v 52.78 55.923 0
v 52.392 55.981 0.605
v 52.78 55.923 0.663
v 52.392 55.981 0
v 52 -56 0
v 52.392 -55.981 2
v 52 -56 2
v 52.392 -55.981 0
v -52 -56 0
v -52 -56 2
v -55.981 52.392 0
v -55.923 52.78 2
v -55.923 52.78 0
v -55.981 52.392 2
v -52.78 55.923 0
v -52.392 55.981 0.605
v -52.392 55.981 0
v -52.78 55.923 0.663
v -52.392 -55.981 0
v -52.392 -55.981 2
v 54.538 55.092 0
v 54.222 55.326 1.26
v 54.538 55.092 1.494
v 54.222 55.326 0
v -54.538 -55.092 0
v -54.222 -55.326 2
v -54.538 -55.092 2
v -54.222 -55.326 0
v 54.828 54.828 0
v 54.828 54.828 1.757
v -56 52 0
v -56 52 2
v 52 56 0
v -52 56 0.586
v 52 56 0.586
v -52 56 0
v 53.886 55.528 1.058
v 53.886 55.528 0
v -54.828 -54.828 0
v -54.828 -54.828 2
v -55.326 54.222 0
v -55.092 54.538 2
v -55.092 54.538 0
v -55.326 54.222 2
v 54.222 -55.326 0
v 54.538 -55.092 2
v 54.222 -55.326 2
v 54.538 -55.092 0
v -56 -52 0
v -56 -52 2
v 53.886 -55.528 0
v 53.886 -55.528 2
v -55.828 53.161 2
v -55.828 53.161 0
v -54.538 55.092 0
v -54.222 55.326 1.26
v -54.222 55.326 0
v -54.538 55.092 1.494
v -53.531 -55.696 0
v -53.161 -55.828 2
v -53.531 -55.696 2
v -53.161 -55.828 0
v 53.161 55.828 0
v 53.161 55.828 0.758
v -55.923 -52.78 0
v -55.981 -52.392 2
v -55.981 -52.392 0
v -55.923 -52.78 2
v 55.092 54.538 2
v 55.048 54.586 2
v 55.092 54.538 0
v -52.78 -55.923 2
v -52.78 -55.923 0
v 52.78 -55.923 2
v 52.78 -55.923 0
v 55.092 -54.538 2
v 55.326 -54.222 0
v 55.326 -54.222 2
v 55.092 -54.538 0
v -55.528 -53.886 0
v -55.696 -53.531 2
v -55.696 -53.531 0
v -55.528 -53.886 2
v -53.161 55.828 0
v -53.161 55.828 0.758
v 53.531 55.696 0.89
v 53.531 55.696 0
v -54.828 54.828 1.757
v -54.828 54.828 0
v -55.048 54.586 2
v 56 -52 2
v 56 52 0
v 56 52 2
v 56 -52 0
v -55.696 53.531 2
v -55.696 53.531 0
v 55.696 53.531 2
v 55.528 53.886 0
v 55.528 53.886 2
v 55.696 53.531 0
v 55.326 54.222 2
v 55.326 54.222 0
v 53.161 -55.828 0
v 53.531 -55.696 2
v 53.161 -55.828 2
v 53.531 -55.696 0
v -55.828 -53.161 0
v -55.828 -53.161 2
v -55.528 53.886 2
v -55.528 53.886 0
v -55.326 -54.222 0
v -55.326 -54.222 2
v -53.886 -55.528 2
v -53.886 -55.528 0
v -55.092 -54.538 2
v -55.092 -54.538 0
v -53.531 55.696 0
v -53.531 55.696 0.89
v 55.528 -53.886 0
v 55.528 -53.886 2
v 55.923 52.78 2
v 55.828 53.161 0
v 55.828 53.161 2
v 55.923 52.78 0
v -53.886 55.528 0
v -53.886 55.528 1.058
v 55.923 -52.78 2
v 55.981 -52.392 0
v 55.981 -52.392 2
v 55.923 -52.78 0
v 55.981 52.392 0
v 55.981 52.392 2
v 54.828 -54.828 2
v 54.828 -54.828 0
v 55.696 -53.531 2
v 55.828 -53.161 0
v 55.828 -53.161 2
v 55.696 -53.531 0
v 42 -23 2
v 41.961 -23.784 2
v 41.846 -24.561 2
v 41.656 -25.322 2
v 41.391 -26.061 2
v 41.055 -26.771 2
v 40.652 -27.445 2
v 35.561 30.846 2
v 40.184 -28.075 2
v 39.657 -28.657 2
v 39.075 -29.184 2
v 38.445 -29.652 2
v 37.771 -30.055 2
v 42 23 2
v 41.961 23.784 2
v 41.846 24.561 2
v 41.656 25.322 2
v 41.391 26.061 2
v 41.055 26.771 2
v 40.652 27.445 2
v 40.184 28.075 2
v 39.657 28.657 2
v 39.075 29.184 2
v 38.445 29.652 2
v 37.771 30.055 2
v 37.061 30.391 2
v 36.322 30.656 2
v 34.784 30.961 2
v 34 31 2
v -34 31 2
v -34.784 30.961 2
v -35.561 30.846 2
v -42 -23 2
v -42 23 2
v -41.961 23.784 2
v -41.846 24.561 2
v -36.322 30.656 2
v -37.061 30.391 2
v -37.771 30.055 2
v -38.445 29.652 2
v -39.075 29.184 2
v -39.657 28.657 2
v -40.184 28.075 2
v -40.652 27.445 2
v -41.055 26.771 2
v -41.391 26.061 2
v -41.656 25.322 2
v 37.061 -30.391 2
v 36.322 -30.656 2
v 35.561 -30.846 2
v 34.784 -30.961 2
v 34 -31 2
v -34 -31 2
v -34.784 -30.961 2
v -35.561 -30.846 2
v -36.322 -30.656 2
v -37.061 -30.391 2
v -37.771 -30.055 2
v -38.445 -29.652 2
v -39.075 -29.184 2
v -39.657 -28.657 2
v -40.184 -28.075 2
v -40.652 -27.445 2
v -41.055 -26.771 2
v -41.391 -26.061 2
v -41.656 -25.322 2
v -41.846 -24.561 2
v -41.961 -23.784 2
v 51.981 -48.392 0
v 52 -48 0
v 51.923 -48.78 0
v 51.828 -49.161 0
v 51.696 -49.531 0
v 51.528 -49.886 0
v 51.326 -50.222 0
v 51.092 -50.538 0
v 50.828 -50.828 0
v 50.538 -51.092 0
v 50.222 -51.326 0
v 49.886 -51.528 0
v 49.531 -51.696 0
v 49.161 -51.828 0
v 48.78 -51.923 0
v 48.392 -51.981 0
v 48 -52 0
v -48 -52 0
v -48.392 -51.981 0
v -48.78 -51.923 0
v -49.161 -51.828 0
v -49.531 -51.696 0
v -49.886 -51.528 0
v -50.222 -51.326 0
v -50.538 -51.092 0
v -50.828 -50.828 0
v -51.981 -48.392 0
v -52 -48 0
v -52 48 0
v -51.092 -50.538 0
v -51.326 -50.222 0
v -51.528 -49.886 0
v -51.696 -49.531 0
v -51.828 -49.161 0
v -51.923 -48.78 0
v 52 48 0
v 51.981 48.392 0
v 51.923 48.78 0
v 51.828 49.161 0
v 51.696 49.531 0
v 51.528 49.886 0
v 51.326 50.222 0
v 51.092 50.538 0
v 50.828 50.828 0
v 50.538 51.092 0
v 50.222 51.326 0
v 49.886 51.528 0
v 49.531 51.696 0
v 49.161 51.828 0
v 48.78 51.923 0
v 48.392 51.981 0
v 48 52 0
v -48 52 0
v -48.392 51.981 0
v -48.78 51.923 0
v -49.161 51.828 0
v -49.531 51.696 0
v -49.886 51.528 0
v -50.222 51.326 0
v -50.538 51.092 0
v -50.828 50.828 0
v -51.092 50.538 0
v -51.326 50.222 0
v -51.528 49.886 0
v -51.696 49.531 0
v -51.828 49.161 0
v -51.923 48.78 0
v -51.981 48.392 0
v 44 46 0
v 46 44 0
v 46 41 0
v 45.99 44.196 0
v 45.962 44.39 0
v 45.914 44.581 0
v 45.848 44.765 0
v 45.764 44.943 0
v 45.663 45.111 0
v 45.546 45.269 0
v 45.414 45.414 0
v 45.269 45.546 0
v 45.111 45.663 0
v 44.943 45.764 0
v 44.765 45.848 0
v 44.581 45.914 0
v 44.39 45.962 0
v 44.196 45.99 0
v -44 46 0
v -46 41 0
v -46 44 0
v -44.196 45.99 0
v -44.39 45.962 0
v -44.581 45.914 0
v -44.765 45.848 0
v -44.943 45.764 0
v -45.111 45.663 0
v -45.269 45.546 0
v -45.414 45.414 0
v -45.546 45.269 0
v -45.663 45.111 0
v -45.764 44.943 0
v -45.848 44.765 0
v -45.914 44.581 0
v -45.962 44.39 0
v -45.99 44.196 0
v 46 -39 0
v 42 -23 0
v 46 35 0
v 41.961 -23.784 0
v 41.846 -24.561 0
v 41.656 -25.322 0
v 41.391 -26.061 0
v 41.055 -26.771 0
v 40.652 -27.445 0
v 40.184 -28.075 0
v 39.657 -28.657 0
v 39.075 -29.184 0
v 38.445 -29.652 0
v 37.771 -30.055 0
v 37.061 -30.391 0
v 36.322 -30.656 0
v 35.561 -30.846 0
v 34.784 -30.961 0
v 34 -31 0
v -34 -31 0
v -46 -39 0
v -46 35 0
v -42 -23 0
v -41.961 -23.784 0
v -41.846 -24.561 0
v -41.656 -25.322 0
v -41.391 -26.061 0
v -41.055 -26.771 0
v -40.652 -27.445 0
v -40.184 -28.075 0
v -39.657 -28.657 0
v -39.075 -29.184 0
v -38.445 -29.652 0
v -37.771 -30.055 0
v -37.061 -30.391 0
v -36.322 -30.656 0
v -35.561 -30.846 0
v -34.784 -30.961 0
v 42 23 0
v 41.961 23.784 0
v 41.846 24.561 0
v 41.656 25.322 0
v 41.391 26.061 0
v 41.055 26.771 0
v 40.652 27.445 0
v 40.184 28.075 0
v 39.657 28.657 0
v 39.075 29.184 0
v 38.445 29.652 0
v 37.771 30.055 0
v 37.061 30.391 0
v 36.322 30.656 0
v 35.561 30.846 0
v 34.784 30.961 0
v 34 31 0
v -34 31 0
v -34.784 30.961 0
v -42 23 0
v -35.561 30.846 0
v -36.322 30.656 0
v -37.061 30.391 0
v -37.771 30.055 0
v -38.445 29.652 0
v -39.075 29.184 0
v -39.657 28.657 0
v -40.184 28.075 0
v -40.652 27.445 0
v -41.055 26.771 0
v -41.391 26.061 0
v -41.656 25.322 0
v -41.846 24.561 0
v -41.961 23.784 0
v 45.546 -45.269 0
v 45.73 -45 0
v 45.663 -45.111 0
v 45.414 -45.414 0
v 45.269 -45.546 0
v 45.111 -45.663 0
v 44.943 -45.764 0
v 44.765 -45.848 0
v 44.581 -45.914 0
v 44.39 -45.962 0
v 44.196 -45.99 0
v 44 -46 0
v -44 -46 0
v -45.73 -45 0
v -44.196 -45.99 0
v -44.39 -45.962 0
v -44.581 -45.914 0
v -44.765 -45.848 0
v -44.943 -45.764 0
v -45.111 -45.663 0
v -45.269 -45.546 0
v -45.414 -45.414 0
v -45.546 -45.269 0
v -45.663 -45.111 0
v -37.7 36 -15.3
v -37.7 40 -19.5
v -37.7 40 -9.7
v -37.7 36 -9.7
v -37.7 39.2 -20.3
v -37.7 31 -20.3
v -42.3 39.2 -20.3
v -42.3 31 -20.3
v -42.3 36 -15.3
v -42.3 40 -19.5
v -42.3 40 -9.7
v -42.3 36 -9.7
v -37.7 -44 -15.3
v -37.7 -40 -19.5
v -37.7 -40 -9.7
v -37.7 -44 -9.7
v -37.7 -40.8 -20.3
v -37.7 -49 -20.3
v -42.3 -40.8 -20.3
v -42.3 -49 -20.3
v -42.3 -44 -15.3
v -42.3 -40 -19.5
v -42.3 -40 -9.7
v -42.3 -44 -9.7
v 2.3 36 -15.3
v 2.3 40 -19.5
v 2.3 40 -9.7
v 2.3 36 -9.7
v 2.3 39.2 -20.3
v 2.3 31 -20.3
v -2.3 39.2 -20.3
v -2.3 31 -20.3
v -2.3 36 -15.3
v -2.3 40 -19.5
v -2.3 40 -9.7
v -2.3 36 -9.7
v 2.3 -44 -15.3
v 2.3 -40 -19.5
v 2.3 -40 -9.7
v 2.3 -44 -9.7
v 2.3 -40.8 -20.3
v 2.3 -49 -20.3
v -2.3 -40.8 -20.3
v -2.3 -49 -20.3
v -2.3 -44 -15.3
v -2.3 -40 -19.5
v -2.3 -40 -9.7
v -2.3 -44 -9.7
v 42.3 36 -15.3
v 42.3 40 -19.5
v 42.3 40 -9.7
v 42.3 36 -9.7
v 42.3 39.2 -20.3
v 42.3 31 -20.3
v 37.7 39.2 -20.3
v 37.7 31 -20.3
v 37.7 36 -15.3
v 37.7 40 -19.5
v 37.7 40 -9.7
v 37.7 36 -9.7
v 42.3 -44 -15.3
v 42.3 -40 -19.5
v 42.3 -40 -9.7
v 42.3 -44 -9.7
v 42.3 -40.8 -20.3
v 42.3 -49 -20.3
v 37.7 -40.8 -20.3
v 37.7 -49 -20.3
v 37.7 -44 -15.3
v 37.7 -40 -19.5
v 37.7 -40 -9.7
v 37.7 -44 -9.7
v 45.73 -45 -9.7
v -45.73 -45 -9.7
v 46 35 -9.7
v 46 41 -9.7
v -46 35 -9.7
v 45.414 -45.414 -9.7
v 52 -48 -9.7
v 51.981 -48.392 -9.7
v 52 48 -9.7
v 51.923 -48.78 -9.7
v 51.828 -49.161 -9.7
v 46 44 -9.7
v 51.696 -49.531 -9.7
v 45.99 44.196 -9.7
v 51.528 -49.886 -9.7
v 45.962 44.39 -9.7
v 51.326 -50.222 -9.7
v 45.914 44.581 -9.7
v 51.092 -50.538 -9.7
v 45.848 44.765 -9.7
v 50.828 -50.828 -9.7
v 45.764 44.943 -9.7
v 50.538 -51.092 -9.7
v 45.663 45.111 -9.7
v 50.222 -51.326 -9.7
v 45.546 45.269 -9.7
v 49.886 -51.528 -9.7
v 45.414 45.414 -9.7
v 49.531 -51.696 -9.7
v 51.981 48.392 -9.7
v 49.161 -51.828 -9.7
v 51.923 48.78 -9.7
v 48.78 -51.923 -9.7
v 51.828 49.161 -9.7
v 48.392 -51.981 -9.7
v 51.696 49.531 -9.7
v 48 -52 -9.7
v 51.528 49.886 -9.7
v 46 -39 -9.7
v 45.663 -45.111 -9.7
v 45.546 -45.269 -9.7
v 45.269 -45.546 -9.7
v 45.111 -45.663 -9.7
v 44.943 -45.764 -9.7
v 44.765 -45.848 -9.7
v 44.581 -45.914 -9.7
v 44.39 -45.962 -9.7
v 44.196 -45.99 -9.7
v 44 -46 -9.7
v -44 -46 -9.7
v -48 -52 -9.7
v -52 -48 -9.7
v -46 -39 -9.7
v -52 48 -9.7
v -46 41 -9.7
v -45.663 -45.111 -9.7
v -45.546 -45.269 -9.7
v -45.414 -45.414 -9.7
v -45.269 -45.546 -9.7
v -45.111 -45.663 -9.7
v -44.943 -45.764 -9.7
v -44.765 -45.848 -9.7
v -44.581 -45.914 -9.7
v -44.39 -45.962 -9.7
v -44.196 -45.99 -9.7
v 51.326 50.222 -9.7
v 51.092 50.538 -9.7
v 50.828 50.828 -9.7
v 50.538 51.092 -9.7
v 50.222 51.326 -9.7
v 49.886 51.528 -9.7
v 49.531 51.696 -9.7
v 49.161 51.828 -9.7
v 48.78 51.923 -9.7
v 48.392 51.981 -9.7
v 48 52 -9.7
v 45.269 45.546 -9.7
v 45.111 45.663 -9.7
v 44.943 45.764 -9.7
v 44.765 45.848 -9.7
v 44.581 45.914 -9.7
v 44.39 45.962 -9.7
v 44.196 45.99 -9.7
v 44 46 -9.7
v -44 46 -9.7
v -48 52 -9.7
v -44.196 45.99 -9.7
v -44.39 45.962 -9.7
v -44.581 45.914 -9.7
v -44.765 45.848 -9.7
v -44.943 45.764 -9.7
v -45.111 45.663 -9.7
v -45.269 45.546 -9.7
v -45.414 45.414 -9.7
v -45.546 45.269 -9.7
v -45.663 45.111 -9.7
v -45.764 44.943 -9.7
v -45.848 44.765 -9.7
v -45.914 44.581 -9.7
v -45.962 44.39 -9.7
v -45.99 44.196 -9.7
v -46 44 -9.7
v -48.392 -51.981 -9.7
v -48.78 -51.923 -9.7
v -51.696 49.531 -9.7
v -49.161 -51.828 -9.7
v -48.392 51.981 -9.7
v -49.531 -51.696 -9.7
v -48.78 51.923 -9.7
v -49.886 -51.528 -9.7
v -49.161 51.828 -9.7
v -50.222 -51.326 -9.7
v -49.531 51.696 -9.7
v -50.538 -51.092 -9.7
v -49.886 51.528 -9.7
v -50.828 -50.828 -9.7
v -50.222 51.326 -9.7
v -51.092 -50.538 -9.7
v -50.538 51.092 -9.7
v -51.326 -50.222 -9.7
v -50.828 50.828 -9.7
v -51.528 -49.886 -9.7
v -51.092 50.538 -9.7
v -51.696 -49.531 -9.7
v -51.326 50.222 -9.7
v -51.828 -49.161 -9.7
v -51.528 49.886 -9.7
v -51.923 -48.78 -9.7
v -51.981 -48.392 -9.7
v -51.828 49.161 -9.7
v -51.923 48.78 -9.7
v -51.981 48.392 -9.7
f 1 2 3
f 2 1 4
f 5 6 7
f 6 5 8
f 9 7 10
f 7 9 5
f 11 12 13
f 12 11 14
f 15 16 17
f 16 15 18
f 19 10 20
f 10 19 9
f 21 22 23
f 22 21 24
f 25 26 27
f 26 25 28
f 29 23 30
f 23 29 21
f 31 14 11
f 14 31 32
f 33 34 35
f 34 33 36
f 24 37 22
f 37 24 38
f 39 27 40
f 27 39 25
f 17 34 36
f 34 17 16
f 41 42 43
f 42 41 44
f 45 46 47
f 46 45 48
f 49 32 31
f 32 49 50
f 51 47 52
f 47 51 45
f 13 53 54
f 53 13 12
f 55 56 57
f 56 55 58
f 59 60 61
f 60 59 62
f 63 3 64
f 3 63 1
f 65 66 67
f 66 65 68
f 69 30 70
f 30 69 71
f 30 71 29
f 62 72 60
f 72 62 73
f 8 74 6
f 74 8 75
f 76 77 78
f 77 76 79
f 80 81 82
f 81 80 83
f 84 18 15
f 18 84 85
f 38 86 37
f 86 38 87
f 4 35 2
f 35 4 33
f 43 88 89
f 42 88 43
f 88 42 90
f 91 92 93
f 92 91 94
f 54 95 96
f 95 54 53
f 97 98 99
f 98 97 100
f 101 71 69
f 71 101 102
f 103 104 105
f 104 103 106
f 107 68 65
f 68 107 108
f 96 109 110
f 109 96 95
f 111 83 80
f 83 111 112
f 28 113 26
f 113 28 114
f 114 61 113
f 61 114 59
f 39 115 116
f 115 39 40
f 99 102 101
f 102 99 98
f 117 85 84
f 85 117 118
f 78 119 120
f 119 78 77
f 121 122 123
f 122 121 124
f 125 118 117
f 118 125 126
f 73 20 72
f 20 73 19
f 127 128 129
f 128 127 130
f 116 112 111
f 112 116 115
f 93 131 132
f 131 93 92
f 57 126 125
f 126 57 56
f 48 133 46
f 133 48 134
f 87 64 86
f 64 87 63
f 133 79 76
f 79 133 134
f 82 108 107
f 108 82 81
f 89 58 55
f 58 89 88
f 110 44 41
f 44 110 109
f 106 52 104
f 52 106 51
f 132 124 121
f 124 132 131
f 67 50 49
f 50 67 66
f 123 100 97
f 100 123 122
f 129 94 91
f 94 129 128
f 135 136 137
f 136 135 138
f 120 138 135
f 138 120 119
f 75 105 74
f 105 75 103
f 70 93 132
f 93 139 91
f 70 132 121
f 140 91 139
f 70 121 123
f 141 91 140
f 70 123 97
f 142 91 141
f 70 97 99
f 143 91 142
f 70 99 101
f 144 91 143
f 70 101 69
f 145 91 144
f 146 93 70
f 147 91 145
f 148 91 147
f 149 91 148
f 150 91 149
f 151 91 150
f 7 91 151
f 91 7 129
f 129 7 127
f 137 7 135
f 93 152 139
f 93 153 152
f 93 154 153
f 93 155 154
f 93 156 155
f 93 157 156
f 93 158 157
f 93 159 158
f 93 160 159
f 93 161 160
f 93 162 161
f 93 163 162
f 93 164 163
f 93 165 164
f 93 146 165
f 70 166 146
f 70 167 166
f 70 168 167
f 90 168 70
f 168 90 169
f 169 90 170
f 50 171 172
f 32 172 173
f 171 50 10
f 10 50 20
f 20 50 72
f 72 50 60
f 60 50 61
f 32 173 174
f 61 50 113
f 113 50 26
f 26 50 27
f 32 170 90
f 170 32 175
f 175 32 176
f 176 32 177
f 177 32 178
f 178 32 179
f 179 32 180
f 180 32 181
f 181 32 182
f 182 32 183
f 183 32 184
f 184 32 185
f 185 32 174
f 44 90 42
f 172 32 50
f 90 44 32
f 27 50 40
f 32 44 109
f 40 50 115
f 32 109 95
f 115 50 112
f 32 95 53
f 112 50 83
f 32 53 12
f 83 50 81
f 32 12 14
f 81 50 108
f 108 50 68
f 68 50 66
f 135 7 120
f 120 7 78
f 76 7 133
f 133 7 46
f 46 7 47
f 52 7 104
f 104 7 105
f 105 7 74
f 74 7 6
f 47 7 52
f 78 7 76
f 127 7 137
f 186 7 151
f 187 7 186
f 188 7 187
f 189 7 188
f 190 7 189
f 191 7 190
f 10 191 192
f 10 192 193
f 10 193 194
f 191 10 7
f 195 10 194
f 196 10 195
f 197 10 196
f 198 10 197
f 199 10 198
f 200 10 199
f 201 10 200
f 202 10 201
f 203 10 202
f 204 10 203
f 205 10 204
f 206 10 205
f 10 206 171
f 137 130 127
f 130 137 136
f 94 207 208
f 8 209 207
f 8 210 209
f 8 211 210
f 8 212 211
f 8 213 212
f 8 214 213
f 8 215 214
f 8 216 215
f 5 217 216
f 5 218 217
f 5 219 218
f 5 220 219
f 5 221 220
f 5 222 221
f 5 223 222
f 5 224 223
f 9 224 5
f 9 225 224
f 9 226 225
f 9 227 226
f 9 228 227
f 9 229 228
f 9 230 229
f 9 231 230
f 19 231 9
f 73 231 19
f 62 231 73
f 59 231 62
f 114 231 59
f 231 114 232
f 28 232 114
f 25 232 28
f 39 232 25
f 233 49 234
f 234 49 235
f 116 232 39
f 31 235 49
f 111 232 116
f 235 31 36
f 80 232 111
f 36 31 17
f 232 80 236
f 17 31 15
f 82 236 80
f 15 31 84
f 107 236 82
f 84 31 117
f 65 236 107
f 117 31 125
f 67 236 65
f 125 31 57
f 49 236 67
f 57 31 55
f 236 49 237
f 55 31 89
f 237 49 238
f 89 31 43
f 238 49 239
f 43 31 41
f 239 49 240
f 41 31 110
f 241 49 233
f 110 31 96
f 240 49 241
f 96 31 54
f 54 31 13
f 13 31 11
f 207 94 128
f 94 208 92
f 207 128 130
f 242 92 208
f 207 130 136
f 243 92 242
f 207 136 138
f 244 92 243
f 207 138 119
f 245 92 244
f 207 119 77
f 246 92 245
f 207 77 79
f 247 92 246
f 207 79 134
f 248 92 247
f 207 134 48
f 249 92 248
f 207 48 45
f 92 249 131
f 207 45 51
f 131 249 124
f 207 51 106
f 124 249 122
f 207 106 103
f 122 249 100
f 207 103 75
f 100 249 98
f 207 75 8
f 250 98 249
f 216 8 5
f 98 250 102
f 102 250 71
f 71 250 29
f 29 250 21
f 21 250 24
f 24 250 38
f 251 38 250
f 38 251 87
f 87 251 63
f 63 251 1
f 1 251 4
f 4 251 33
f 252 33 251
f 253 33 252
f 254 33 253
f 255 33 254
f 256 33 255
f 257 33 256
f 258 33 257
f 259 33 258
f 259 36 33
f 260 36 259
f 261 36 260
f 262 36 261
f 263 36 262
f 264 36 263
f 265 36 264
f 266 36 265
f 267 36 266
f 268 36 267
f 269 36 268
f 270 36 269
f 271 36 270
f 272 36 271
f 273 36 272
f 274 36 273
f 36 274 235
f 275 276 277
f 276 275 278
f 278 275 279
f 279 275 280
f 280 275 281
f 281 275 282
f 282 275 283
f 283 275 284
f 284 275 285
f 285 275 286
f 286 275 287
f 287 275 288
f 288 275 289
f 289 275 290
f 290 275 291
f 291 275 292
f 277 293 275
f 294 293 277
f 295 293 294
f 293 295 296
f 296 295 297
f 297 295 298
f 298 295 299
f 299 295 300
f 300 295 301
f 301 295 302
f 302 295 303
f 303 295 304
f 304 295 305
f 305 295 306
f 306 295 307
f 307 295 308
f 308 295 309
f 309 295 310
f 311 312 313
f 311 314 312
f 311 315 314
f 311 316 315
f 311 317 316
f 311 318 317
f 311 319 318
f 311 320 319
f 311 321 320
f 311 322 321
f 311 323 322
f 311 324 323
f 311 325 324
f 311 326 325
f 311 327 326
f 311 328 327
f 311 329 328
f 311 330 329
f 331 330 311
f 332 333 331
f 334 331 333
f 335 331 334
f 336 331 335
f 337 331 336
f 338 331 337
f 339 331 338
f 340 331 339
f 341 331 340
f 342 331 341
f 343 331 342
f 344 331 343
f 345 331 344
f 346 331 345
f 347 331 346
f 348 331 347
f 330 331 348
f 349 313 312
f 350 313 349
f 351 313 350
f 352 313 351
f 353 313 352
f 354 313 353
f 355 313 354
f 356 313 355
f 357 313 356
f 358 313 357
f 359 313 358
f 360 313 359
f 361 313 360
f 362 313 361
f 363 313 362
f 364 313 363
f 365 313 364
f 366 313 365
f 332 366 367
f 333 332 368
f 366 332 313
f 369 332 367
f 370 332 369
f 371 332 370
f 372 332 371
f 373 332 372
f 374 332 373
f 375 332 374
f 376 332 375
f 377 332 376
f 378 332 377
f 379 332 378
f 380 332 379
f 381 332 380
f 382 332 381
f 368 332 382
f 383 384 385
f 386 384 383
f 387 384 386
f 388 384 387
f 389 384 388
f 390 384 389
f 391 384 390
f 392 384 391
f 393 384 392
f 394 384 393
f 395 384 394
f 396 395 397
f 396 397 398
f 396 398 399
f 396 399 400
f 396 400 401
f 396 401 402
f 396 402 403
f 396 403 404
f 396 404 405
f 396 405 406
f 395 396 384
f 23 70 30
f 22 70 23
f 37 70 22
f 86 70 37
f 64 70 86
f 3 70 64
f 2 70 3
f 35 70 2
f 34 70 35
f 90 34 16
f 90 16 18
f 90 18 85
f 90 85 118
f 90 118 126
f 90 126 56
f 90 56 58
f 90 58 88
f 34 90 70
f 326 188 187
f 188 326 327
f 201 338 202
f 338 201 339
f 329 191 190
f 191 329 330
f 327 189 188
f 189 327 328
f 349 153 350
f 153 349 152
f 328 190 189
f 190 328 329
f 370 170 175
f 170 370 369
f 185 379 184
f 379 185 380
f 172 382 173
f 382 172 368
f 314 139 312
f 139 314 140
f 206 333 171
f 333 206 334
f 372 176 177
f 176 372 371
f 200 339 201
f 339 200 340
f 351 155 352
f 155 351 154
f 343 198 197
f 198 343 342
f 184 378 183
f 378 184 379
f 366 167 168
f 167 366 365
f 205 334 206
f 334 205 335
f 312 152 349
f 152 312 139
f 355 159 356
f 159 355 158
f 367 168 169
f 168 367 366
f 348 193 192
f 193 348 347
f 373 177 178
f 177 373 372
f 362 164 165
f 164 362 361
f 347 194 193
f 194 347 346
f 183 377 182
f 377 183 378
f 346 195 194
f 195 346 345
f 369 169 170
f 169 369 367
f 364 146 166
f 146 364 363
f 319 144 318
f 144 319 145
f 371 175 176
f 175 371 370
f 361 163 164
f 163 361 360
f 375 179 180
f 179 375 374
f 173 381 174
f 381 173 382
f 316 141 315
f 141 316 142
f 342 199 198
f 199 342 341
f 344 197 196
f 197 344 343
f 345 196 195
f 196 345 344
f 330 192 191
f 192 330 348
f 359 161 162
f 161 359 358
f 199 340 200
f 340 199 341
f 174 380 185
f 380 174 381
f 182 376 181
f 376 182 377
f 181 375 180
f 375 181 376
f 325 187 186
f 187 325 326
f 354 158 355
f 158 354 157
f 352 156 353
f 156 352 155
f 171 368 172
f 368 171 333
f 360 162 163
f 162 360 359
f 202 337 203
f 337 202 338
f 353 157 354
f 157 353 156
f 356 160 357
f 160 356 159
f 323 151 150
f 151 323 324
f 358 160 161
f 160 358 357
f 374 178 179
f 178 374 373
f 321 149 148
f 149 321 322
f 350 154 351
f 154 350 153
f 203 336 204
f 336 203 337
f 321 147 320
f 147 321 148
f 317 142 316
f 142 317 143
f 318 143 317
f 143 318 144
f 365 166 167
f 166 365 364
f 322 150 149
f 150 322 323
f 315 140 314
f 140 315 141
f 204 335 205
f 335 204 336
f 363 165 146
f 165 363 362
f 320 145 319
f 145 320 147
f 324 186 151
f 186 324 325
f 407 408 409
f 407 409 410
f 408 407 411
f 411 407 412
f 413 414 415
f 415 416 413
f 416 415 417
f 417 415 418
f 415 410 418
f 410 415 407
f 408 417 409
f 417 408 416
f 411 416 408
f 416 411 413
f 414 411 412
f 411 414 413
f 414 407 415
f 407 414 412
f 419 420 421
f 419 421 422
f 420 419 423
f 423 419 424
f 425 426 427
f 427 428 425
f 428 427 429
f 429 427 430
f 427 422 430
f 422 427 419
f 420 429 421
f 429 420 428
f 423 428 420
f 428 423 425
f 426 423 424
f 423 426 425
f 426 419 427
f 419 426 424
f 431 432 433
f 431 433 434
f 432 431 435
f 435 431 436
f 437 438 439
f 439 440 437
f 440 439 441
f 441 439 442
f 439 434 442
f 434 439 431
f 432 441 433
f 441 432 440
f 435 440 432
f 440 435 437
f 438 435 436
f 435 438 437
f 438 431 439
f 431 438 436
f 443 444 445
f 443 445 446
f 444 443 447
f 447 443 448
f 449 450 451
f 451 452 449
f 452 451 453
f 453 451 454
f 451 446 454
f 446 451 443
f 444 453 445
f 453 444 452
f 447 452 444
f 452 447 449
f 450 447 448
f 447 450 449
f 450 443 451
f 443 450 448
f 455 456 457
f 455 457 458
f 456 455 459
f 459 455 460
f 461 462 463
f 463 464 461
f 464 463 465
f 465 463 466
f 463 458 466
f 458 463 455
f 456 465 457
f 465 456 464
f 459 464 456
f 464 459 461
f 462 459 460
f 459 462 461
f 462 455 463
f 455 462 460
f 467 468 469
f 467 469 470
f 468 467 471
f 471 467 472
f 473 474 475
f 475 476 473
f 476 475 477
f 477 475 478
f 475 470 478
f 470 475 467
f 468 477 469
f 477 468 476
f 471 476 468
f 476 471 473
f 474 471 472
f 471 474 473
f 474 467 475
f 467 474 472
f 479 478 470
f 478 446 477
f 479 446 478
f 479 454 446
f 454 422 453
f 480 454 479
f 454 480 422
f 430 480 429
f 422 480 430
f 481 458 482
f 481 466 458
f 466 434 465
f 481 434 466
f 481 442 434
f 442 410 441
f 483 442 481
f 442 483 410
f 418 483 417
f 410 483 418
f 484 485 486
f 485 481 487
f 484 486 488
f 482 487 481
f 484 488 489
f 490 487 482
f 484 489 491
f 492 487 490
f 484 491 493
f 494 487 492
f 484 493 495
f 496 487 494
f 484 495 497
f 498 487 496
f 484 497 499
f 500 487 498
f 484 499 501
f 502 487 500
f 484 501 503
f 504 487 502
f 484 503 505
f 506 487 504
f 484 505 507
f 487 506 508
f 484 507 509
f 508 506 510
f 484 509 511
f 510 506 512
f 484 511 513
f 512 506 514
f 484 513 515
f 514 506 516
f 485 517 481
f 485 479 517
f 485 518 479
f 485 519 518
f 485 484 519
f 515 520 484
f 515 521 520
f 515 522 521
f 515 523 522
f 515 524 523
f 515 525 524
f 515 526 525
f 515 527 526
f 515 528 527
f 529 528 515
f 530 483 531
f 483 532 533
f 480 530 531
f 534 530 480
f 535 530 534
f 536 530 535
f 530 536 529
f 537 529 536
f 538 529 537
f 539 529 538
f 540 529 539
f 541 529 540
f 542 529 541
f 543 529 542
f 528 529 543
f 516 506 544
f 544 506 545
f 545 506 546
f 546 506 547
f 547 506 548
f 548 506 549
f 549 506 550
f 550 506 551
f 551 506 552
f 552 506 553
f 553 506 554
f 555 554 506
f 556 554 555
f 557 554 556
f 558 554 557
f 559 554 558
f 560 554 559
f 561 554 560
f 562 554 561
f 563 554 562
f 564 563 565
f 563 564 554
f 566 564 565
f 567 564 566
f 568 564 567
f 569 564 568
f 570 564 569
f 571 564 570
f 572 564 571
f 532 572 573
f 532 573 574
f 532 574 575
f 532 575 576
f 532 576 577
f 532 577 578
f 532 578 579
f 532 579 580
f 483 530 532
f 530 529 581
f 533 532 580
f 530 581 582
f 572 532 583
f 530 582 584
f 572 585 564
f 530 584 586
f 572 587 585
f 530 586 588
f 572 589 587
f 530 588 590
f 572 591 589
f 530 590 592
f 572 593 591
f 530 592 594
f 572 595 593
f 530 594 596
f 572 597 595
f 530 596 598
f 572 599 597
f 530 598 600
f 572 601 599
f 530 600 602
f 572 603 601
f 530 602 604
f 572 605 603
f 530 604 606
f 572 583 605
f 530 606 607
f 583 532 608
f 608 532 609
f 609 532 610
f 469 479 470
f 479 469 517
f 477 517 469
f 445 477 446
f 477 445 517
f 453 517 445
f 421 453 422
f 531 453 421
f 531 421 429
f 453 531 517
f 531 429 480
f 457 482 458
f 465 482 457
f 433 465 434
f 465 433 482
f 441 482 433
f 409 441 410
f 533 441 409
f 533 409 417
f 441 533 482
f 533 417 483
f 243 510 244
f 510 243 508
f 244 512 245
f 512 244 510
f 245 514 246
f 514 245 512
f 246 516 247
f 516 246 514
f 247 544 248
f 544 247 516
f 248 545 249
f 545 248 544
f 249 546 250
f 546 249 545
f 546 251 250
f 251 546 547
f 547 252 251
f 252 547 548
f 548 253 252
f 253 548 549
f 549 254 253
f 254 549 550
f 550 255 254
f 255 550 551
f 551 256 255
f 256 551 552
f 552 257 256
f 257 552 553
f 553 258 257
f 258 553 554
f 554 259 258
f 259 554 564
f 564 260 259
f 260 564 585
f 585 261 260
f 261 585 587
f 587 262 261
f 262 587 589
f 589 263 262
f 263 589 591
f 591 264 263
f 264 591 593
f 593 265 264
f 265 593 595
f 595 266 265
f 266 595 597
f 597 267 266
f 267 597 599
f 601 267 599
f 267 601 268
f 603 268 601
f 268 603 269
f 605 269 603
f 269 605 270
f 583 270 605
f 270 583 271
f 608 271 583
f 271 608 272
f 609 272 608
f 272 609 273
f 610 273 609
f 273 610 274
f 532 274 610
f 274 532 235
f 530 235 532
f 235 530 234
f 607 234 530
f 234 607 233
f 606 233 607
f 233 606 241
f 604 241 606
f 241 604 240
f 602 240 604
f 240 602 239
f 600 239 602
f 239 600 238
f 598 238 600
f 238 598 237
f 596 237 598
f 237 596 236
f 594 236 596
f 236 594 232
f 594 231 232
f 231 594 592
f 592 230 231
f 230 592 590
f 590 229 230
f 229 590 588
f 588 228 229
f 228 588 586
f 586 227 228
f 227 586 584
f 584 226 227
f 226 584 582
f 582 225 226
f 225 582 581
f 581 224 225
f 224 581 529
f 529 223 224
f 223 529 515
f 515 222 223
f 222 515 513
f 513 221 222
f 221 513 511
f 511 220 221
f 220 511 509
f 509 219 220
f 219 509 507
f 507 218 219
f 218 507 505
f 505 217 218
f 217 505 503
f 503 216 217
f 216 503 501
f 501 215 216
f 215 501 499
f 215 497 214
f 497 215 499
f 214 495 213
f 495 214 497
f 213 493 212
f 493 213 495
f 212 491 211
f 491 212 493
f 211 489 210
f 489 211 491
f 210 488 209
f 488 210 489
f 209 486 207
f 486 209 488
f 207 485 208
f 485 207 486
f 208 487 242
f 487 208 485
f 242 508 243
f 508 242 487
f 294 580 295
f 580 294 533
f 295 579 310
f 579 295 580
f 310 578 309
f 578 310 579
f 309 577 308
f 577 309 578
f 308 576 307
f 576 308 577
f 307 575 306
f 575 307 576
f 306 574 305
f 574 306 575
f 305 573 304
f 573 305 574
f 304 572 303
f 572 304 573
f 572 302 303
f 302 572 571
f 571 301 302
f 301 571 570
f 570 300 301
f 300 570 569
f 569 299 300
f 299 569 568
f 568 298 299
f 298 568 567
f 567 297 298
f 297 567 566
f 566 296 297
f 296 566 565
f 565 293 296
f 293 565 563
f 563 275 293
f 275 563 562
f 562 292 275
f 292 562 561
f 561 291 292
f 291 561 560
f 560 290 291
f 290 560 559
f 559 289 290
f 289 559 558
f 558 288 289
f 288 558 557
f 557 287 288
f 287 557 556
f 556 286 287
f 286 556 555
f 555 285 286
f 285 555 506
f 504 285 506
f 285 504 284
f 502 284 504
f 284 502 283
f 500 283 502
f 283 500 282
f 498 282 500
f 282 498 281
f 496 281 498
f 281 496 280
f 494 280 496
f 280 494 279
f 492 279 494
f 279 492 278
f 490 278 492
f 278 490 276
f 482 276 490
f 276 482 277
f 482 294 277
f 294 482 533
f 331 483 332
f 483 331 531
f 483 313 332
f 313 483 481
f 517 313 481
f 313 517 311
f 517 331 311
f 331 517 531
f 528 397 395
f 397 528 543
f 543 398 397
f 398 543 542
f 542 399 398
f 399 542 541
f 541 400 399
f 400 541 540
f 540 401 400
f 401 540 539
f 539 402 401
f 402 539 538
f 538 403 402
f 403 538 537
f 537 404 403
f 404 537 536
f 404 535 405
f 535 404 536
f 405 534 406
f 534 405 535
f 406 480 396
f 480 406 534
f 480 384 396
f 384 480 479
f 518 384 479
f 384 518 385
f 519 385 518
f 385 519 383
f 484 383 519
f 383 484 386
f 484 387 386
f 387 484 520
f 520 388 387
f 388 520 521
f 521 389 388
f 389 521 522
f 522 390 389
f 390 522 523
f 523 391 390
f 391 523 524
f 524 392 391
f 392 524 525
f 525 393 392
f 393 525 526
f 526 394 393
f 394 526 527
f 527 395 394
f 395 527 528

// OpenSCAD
// =============================================================================
//  SKADIS mount kit for the rain "the101" 5G router
// =============================================================================
//
//  MOUNT TYPE (read off a photo of this unit's base, then measured directly):
//
//    the101 is a 230 x 230 x 56 mm rounded-square 5G CPE. Its underside has a
//    shallow square WELL ringed by moulded plastic retention TABS. A flat plate
//    slides in sideways and is captured under those tabs. There are no screw
//    bosses in the router.
//
//    Interface numbers, all measured off the router itself with calipers.
//    Commercially sold "the101 brackets" list dimensions that do not match this
//    unit, so nothing here is taken from them:
//      tab slot gap ......... 4.0 mm    (measured)
//      tab width ............ 12  mm    (measured)
//      well width ........... 112 mm    (measured)
//      well depth ........... NOT MEASURED - see well_depth below
//      BUILD TARGET ......... 112 x 112 x 2.0 mm, with a 104 mm standoff ring.
//                             2.0 mm in a 4.0 mm slot leaves ~2 mm of slop;
//                             see tongue_t.
//
//    So: a SLIDE-IN CAPTIVE PLATE. This file rebuilds that plate with SKADIS
//    pegs on the back instead of wall screws.
//
//  SKADIS interface (IKEA pegboard):
//    slots 5.0 x 15.0 mm on a plain 40 mm rectangular grid, board 5.2 mm thick.
//    Accessories hang off the BOTTOM edge of a slot.
//
//  ORIENTATION - this matters:
//    Hang the bracket so the router is lowered DOWN onto the tongue, i.e. the
//    well's open side faces down once the router is up. Gravity then holds the
//    plate seated, so no latch or detent is needed. To remove, lift.
//
//  PARTS - pick with `part` below:
//    "bracket" - the slide-in captive plate. The real answer. Prints flat with
//                no supports.
//    "hooks"   - a pair of cradle hooks. Needs nothing but the published body
//                size, so it works even if your unit's well differs at all.
// =============================================================================

/* [What to render] */
part = "bracket"; // [bracket:Slide-in plate, hooks:Cradle hooks, all:Both laid out]

/* [SKADIS board - leave alone for a genuine board] */
skadis_pitch = 40;    // slot grid pitch, both axes
slot_w       = 5.0;   // slot width
slot_h       = 15.0;  // slot height
board_t      = 5.2;   // pegboard thickness (use 3.0 for the thin variant)

/* [Printer fit tuning] */
peg_clear = 0.4;  // subtracted from slot_w to get peg width. Raise if pegs bind.
peg_gap   = 0.4;  // slop behind the board before the barb bites

/* [Peg shape] */
neck_h = 4.0;   // peg height sitting inside the slot
barb_h = 5.0;   // how far the barb drops behind the board
barb_d = 5.0;   // barb depth. Keep == barb_h: that is what makes the barb's
                // underside a 45 deg self-supporting face.

/* [Router interface - measured] */
tab_gap    = 4.0;    // the 4 mm slot under the retention tabs. Asserted against
                     // tongue_t below: a plate thicker than this will not enter.
plate_sq   = 112.0;  // what this unit's well takes
well_depth = 5.7;    // ASSUMED, not measured. Well floor down to the router's
                     // outer rim. Only feeds the standoff. Over-estimating is
                     // safe - it just widens the air gap. Under-estimating means
                     // the ribs foul the rim and the plate will not seat, so
                     // this deliberately errs high. Measure yours to tighten it.
tongue_fit = 0;      // extra clearance off plate_sq. Raise if it binds going in.

/* [Slide-in bracket] */
tongue_t = 2.0;   // plate thickness. NOTE this is still under the 4.0 mm tab
                  // slot, so the plate has ~2.0 mm of slop and the router can
                  // rock slightly. Raise toward 3.8 for a snug fit.
air_gap  = 6.0;   // clear air behind the router's vented underside. The whole
                  // point of the standoff ribs: mounted vertically, that face
                  // would otherwise sit flat on the fibreboard.
rib_w    = 6.0;   // standoff rib width. A rib's stiffness goes as its HEIGHT
                  // cubed and only linearly with width, so the 9.7 mm standoff
                  // is doing the work - 10 mm of width was just mass. 6 mm still
                  // leaves 1 mm either side of a peg neck.

rib_in   = 4.0;   // perimeter rib inset from the plate edge, i.e. the width of
                  // the bare lip around the outside of the plate. Also sets the
                  // ring's outer size: plate_sq - 2*rib_in = 104.
lead_in  = 1.0;   // 45 deg chamfer on the tongue's leading (top) edge
peg_cols = [-40, 0, 40];   // peg x positions. Spacings must be multiples of 40.
peg_rows = [40, -40];      // peg y positions. Spacings must be multiples of 40.

/* [Weight saving] */
lighten    = true;  // cut the dead centre out of the plate
light_edge = 4.0;   // plate left between that cutout and the ribs

/* [Cradle hooks] */
body_t       = 56;   // the101 body thickness, from rain's spec
hook_plate_w = 30;   // backplate width
hook_plate_h = 80;   // backplate height: 40 mm peg column + gusset tail below
hook_plate_t = 5;    // backplate thickness
hook_shelf_d = body_t + 6;   // shelf depth, the body plus a little
hook_shelf_t = 5;    // shelf thickness
hook_lip_h   = 22;   // front lip, stops the router tipping off
hook_lip_t   = 5;    // front lip thickness
hook_gusset  = 24;   // web height. The backplate runs on DOWN past the shelf by
                     // this much so the web has something to tie into - a web
                     // above the shelf would foul the router body.

$fn = 64;

assert(tongue_t <= tab_gap,
       "tongue_t exceeds tab_gap - the plate will not enter the tab slot");

// Standoff needed at the plate's back face. The plate sits tongue_t into the
// well, so the router's rim hangs (well_depth - tongue_t) proud of the plate's
// back and the ribs must clear that before the air gap even starts. With
// well_depth only assumed, this errs high on purpose.
standoff = air_gap + (well_depth - tongue_t);

// =============================================================================
//  SKADIS peg
// =============================================================================
//  Local origin sits on the plate's BACK face, neck top at y = 0. The peg grows
//  into -Z: first across the standoff gap, then through the board, then the barb.
//
//  Fitting: push all pegs in near the top of their slots, then drop the part
//  ~11 mm. The neck lands on the slot's bottom edge and the barb sits behind the
//  board. neck_h + barb_h = 9 mm, comfortably inside the 15 mm slot.
//
//  Printing: with the plate's front face on the bed (pegs up) the barb's only
//  overhang is its 45 deg ramp, so this needs no supports.

module skadis_peg(so = 0) {
    w   = slot_w - peg_clear;         // 4.6 in a 5.0 slot
    nd  = so + board_t + peg_gap;     // neck depth: standoff, then through
    tot = nd + barb_d;                // total protrusion behind the plate
    ch  = 0.8;                        // lead-in chamfer on the back top corner

    pts = [
        [0,           0                ],
        [-(tot - ch),  0               ],
        [-tot,        -ch              ],
        [-tot,        -(neck_h + barb_h)],  // barb tip: deepest and lowest
        [-nd,         -neck_h          ],   // 45 deg ramp back up to the neck
        [0,           -neck_h          ],
    ];

    translate([w / 2, 0, 0])
        rotate([0, -90, 0])
            linear_extrude(height = w)
                polygon(pts);
}

// rounded rectangle / square helpers
module rrect(w, h, r) {
    offset(r = r) offset(r = -r) square([w, h], center = true);
}
module rsq(size, r) { rrect(size, size, r); }

// =============================================================================
//  Part 1: slide-in captive plate
// =============================================================================
//  Plate front face (z = tongue_t) lies against the well floor and the tabs grip
//  its edges. Standoff ribs and pegs grow into -Z toward the pegboard.
//
//  Deliberately ONE flat plate rather than a stepped plate with an oversailing
//  slab: a step would leave an unsupported ledge on the bed. This way the whole
//  thing prints face-down with nothing but the self-supporting peg barbs above.

module slide_in_bracket() {
    sq   = plate_sq - tongue_fit;              // 112.0
    lead = min(lead_in, tongue_t * 0.6);       // never chamfer the plate away

    // The dead centre of the plate: everything inside the ring and between the
    // two cross ribs. No load path runs through it, so it is the one place mass
    // can leave without costing anything.
    ring_in = sq - 2 * rib_in - 2 * rib_w;                      // ring's bore
    rib_in_edge = abs(peg_rows[0]) - neck_h / 2 - rib_w / 2;    // cross rib inner edge
    win_x = ring_in - 2 * light_edge;
    win_y = 2 * rib_in_edge - 2 * light_edge;

    // ---- plate, with a chamfered leading edge on +Y so it feeds under the
    //      tabs instead of butting into them
    difference() {
        linear_extrude(height = tongue_t)
            rsq(sq, 4);

        translate([0, sq / 2, tongue_t])
            rotate([45, 0, 0])
                translate([-sq, -lead, -lead])
                    cube([sq * 2, lead * 2, lead * 2]);

        // weight-saving window. The tabs grip the perimeter and the load runs
        // perimeter -> ring -> cross ribs -> pegs, all of it outside this hole,
        // so it costs no strength. It also vents the well.
        if (lighten)
            translate([0, 0, -1])
                linear_extrude(height = tongue_t + 2)
                    rrect(win_x, win_y, 8);
    }

    // ---- standoff ribs on the back: a perimeter ring plus a cross rib through
    //      each peg row. The ring carries the load onto the board and stiffens
    //      the plate; the cross ribs are the pegs' roots.
    translate([0, 0, -standoff])
        linear_extrude(height = standoff) {
            // perimeter ring
            difference() {
                rsq(sq - 2 * rib_in, 4);
                rsq(sq - 2 * rib_in - 2 * rib_w, 2);
            }
            // cross rib centred on each peg row's neck
            for (y = peg_rows)
                translate([0, y - neck_h / 2, 0])
                    square([sq - 2 * rib_in, rib_w], center = true);
        }

    // ---- pegs
    for (x = peg_cols, y = peg_rows)
        translate([x, y, 0])
            skadis_peg(standoff);
}

// =============================================================================
//  Part 2: cradle hooks
// =============================================================================
//  No router measurements needed at all. Two of these, 160 mm apart (4 slot
//  columns), carry the 230 mm wide body. The 62 mm shelf takes the full 56 mm
//  depth and the lip stops it tipping off the front.
//
//  PRINT: lay it on its side, the 30 mm flat face on the bed. The body then
//  extrudes in the bed plane with no overhangs at all. The two pegs are the only
//  exception - give them tree supports.

module cradle_hook() {
    w  = hook_plate_w;
    h  = hook_plate_h;
    t  = hook_plate_t;
    st = hook_shelf_t;
    yb = -h / 2;                // backplate bottom edge
    ys = yb + hook_gusset;      // shelf underside, sits a gusset's height up

    union() {
        // backplate
        translate([-w / 2, yb, 0])
            cube([w, h, t]);

        // shelf. Router's bottom edge lands on its top face, at ys + st.
        translate([-w / 2, ys, t])
            cube([w, st, hook_shelf_d]);

        // front lip, 1 mm clear of the router's front face
        translate([-w / 2, ys, t + hook_shelf_d - hook_lip_t])
            cube([w, st + hook_lip_h, hook_lip_t]);

        // triangular web from the shelf's UNDERSIDE down the backplate
        translate([w / 2, 0, 0])
            rotate([0, -90, 0])
                linear_extrude(height = w)
                    polygon([
                        [t,               ys],
                        [t,               yb],
                        [t + hook_gusset, ys],
                    ]);
    }

    // two pegs in one column, 40 mm apart. A single peg would let the hook swing
    // about its own axis; two rows lock it.
    for (y = [skadis_pitch / 2, -skadis_pitch / 2])
        translate([0, y, 0])
            skadis_peg(0);
}

// =============================================================================
//  Render
// =============================================================================

if      (part == "bracket") slide_in_bracket();
else if (part == "hooks")   cradle_hook();
else if (part == "all") {
    slide_in_bracket();
    translate([-120, 0, 0]) cradle_hook();
}
